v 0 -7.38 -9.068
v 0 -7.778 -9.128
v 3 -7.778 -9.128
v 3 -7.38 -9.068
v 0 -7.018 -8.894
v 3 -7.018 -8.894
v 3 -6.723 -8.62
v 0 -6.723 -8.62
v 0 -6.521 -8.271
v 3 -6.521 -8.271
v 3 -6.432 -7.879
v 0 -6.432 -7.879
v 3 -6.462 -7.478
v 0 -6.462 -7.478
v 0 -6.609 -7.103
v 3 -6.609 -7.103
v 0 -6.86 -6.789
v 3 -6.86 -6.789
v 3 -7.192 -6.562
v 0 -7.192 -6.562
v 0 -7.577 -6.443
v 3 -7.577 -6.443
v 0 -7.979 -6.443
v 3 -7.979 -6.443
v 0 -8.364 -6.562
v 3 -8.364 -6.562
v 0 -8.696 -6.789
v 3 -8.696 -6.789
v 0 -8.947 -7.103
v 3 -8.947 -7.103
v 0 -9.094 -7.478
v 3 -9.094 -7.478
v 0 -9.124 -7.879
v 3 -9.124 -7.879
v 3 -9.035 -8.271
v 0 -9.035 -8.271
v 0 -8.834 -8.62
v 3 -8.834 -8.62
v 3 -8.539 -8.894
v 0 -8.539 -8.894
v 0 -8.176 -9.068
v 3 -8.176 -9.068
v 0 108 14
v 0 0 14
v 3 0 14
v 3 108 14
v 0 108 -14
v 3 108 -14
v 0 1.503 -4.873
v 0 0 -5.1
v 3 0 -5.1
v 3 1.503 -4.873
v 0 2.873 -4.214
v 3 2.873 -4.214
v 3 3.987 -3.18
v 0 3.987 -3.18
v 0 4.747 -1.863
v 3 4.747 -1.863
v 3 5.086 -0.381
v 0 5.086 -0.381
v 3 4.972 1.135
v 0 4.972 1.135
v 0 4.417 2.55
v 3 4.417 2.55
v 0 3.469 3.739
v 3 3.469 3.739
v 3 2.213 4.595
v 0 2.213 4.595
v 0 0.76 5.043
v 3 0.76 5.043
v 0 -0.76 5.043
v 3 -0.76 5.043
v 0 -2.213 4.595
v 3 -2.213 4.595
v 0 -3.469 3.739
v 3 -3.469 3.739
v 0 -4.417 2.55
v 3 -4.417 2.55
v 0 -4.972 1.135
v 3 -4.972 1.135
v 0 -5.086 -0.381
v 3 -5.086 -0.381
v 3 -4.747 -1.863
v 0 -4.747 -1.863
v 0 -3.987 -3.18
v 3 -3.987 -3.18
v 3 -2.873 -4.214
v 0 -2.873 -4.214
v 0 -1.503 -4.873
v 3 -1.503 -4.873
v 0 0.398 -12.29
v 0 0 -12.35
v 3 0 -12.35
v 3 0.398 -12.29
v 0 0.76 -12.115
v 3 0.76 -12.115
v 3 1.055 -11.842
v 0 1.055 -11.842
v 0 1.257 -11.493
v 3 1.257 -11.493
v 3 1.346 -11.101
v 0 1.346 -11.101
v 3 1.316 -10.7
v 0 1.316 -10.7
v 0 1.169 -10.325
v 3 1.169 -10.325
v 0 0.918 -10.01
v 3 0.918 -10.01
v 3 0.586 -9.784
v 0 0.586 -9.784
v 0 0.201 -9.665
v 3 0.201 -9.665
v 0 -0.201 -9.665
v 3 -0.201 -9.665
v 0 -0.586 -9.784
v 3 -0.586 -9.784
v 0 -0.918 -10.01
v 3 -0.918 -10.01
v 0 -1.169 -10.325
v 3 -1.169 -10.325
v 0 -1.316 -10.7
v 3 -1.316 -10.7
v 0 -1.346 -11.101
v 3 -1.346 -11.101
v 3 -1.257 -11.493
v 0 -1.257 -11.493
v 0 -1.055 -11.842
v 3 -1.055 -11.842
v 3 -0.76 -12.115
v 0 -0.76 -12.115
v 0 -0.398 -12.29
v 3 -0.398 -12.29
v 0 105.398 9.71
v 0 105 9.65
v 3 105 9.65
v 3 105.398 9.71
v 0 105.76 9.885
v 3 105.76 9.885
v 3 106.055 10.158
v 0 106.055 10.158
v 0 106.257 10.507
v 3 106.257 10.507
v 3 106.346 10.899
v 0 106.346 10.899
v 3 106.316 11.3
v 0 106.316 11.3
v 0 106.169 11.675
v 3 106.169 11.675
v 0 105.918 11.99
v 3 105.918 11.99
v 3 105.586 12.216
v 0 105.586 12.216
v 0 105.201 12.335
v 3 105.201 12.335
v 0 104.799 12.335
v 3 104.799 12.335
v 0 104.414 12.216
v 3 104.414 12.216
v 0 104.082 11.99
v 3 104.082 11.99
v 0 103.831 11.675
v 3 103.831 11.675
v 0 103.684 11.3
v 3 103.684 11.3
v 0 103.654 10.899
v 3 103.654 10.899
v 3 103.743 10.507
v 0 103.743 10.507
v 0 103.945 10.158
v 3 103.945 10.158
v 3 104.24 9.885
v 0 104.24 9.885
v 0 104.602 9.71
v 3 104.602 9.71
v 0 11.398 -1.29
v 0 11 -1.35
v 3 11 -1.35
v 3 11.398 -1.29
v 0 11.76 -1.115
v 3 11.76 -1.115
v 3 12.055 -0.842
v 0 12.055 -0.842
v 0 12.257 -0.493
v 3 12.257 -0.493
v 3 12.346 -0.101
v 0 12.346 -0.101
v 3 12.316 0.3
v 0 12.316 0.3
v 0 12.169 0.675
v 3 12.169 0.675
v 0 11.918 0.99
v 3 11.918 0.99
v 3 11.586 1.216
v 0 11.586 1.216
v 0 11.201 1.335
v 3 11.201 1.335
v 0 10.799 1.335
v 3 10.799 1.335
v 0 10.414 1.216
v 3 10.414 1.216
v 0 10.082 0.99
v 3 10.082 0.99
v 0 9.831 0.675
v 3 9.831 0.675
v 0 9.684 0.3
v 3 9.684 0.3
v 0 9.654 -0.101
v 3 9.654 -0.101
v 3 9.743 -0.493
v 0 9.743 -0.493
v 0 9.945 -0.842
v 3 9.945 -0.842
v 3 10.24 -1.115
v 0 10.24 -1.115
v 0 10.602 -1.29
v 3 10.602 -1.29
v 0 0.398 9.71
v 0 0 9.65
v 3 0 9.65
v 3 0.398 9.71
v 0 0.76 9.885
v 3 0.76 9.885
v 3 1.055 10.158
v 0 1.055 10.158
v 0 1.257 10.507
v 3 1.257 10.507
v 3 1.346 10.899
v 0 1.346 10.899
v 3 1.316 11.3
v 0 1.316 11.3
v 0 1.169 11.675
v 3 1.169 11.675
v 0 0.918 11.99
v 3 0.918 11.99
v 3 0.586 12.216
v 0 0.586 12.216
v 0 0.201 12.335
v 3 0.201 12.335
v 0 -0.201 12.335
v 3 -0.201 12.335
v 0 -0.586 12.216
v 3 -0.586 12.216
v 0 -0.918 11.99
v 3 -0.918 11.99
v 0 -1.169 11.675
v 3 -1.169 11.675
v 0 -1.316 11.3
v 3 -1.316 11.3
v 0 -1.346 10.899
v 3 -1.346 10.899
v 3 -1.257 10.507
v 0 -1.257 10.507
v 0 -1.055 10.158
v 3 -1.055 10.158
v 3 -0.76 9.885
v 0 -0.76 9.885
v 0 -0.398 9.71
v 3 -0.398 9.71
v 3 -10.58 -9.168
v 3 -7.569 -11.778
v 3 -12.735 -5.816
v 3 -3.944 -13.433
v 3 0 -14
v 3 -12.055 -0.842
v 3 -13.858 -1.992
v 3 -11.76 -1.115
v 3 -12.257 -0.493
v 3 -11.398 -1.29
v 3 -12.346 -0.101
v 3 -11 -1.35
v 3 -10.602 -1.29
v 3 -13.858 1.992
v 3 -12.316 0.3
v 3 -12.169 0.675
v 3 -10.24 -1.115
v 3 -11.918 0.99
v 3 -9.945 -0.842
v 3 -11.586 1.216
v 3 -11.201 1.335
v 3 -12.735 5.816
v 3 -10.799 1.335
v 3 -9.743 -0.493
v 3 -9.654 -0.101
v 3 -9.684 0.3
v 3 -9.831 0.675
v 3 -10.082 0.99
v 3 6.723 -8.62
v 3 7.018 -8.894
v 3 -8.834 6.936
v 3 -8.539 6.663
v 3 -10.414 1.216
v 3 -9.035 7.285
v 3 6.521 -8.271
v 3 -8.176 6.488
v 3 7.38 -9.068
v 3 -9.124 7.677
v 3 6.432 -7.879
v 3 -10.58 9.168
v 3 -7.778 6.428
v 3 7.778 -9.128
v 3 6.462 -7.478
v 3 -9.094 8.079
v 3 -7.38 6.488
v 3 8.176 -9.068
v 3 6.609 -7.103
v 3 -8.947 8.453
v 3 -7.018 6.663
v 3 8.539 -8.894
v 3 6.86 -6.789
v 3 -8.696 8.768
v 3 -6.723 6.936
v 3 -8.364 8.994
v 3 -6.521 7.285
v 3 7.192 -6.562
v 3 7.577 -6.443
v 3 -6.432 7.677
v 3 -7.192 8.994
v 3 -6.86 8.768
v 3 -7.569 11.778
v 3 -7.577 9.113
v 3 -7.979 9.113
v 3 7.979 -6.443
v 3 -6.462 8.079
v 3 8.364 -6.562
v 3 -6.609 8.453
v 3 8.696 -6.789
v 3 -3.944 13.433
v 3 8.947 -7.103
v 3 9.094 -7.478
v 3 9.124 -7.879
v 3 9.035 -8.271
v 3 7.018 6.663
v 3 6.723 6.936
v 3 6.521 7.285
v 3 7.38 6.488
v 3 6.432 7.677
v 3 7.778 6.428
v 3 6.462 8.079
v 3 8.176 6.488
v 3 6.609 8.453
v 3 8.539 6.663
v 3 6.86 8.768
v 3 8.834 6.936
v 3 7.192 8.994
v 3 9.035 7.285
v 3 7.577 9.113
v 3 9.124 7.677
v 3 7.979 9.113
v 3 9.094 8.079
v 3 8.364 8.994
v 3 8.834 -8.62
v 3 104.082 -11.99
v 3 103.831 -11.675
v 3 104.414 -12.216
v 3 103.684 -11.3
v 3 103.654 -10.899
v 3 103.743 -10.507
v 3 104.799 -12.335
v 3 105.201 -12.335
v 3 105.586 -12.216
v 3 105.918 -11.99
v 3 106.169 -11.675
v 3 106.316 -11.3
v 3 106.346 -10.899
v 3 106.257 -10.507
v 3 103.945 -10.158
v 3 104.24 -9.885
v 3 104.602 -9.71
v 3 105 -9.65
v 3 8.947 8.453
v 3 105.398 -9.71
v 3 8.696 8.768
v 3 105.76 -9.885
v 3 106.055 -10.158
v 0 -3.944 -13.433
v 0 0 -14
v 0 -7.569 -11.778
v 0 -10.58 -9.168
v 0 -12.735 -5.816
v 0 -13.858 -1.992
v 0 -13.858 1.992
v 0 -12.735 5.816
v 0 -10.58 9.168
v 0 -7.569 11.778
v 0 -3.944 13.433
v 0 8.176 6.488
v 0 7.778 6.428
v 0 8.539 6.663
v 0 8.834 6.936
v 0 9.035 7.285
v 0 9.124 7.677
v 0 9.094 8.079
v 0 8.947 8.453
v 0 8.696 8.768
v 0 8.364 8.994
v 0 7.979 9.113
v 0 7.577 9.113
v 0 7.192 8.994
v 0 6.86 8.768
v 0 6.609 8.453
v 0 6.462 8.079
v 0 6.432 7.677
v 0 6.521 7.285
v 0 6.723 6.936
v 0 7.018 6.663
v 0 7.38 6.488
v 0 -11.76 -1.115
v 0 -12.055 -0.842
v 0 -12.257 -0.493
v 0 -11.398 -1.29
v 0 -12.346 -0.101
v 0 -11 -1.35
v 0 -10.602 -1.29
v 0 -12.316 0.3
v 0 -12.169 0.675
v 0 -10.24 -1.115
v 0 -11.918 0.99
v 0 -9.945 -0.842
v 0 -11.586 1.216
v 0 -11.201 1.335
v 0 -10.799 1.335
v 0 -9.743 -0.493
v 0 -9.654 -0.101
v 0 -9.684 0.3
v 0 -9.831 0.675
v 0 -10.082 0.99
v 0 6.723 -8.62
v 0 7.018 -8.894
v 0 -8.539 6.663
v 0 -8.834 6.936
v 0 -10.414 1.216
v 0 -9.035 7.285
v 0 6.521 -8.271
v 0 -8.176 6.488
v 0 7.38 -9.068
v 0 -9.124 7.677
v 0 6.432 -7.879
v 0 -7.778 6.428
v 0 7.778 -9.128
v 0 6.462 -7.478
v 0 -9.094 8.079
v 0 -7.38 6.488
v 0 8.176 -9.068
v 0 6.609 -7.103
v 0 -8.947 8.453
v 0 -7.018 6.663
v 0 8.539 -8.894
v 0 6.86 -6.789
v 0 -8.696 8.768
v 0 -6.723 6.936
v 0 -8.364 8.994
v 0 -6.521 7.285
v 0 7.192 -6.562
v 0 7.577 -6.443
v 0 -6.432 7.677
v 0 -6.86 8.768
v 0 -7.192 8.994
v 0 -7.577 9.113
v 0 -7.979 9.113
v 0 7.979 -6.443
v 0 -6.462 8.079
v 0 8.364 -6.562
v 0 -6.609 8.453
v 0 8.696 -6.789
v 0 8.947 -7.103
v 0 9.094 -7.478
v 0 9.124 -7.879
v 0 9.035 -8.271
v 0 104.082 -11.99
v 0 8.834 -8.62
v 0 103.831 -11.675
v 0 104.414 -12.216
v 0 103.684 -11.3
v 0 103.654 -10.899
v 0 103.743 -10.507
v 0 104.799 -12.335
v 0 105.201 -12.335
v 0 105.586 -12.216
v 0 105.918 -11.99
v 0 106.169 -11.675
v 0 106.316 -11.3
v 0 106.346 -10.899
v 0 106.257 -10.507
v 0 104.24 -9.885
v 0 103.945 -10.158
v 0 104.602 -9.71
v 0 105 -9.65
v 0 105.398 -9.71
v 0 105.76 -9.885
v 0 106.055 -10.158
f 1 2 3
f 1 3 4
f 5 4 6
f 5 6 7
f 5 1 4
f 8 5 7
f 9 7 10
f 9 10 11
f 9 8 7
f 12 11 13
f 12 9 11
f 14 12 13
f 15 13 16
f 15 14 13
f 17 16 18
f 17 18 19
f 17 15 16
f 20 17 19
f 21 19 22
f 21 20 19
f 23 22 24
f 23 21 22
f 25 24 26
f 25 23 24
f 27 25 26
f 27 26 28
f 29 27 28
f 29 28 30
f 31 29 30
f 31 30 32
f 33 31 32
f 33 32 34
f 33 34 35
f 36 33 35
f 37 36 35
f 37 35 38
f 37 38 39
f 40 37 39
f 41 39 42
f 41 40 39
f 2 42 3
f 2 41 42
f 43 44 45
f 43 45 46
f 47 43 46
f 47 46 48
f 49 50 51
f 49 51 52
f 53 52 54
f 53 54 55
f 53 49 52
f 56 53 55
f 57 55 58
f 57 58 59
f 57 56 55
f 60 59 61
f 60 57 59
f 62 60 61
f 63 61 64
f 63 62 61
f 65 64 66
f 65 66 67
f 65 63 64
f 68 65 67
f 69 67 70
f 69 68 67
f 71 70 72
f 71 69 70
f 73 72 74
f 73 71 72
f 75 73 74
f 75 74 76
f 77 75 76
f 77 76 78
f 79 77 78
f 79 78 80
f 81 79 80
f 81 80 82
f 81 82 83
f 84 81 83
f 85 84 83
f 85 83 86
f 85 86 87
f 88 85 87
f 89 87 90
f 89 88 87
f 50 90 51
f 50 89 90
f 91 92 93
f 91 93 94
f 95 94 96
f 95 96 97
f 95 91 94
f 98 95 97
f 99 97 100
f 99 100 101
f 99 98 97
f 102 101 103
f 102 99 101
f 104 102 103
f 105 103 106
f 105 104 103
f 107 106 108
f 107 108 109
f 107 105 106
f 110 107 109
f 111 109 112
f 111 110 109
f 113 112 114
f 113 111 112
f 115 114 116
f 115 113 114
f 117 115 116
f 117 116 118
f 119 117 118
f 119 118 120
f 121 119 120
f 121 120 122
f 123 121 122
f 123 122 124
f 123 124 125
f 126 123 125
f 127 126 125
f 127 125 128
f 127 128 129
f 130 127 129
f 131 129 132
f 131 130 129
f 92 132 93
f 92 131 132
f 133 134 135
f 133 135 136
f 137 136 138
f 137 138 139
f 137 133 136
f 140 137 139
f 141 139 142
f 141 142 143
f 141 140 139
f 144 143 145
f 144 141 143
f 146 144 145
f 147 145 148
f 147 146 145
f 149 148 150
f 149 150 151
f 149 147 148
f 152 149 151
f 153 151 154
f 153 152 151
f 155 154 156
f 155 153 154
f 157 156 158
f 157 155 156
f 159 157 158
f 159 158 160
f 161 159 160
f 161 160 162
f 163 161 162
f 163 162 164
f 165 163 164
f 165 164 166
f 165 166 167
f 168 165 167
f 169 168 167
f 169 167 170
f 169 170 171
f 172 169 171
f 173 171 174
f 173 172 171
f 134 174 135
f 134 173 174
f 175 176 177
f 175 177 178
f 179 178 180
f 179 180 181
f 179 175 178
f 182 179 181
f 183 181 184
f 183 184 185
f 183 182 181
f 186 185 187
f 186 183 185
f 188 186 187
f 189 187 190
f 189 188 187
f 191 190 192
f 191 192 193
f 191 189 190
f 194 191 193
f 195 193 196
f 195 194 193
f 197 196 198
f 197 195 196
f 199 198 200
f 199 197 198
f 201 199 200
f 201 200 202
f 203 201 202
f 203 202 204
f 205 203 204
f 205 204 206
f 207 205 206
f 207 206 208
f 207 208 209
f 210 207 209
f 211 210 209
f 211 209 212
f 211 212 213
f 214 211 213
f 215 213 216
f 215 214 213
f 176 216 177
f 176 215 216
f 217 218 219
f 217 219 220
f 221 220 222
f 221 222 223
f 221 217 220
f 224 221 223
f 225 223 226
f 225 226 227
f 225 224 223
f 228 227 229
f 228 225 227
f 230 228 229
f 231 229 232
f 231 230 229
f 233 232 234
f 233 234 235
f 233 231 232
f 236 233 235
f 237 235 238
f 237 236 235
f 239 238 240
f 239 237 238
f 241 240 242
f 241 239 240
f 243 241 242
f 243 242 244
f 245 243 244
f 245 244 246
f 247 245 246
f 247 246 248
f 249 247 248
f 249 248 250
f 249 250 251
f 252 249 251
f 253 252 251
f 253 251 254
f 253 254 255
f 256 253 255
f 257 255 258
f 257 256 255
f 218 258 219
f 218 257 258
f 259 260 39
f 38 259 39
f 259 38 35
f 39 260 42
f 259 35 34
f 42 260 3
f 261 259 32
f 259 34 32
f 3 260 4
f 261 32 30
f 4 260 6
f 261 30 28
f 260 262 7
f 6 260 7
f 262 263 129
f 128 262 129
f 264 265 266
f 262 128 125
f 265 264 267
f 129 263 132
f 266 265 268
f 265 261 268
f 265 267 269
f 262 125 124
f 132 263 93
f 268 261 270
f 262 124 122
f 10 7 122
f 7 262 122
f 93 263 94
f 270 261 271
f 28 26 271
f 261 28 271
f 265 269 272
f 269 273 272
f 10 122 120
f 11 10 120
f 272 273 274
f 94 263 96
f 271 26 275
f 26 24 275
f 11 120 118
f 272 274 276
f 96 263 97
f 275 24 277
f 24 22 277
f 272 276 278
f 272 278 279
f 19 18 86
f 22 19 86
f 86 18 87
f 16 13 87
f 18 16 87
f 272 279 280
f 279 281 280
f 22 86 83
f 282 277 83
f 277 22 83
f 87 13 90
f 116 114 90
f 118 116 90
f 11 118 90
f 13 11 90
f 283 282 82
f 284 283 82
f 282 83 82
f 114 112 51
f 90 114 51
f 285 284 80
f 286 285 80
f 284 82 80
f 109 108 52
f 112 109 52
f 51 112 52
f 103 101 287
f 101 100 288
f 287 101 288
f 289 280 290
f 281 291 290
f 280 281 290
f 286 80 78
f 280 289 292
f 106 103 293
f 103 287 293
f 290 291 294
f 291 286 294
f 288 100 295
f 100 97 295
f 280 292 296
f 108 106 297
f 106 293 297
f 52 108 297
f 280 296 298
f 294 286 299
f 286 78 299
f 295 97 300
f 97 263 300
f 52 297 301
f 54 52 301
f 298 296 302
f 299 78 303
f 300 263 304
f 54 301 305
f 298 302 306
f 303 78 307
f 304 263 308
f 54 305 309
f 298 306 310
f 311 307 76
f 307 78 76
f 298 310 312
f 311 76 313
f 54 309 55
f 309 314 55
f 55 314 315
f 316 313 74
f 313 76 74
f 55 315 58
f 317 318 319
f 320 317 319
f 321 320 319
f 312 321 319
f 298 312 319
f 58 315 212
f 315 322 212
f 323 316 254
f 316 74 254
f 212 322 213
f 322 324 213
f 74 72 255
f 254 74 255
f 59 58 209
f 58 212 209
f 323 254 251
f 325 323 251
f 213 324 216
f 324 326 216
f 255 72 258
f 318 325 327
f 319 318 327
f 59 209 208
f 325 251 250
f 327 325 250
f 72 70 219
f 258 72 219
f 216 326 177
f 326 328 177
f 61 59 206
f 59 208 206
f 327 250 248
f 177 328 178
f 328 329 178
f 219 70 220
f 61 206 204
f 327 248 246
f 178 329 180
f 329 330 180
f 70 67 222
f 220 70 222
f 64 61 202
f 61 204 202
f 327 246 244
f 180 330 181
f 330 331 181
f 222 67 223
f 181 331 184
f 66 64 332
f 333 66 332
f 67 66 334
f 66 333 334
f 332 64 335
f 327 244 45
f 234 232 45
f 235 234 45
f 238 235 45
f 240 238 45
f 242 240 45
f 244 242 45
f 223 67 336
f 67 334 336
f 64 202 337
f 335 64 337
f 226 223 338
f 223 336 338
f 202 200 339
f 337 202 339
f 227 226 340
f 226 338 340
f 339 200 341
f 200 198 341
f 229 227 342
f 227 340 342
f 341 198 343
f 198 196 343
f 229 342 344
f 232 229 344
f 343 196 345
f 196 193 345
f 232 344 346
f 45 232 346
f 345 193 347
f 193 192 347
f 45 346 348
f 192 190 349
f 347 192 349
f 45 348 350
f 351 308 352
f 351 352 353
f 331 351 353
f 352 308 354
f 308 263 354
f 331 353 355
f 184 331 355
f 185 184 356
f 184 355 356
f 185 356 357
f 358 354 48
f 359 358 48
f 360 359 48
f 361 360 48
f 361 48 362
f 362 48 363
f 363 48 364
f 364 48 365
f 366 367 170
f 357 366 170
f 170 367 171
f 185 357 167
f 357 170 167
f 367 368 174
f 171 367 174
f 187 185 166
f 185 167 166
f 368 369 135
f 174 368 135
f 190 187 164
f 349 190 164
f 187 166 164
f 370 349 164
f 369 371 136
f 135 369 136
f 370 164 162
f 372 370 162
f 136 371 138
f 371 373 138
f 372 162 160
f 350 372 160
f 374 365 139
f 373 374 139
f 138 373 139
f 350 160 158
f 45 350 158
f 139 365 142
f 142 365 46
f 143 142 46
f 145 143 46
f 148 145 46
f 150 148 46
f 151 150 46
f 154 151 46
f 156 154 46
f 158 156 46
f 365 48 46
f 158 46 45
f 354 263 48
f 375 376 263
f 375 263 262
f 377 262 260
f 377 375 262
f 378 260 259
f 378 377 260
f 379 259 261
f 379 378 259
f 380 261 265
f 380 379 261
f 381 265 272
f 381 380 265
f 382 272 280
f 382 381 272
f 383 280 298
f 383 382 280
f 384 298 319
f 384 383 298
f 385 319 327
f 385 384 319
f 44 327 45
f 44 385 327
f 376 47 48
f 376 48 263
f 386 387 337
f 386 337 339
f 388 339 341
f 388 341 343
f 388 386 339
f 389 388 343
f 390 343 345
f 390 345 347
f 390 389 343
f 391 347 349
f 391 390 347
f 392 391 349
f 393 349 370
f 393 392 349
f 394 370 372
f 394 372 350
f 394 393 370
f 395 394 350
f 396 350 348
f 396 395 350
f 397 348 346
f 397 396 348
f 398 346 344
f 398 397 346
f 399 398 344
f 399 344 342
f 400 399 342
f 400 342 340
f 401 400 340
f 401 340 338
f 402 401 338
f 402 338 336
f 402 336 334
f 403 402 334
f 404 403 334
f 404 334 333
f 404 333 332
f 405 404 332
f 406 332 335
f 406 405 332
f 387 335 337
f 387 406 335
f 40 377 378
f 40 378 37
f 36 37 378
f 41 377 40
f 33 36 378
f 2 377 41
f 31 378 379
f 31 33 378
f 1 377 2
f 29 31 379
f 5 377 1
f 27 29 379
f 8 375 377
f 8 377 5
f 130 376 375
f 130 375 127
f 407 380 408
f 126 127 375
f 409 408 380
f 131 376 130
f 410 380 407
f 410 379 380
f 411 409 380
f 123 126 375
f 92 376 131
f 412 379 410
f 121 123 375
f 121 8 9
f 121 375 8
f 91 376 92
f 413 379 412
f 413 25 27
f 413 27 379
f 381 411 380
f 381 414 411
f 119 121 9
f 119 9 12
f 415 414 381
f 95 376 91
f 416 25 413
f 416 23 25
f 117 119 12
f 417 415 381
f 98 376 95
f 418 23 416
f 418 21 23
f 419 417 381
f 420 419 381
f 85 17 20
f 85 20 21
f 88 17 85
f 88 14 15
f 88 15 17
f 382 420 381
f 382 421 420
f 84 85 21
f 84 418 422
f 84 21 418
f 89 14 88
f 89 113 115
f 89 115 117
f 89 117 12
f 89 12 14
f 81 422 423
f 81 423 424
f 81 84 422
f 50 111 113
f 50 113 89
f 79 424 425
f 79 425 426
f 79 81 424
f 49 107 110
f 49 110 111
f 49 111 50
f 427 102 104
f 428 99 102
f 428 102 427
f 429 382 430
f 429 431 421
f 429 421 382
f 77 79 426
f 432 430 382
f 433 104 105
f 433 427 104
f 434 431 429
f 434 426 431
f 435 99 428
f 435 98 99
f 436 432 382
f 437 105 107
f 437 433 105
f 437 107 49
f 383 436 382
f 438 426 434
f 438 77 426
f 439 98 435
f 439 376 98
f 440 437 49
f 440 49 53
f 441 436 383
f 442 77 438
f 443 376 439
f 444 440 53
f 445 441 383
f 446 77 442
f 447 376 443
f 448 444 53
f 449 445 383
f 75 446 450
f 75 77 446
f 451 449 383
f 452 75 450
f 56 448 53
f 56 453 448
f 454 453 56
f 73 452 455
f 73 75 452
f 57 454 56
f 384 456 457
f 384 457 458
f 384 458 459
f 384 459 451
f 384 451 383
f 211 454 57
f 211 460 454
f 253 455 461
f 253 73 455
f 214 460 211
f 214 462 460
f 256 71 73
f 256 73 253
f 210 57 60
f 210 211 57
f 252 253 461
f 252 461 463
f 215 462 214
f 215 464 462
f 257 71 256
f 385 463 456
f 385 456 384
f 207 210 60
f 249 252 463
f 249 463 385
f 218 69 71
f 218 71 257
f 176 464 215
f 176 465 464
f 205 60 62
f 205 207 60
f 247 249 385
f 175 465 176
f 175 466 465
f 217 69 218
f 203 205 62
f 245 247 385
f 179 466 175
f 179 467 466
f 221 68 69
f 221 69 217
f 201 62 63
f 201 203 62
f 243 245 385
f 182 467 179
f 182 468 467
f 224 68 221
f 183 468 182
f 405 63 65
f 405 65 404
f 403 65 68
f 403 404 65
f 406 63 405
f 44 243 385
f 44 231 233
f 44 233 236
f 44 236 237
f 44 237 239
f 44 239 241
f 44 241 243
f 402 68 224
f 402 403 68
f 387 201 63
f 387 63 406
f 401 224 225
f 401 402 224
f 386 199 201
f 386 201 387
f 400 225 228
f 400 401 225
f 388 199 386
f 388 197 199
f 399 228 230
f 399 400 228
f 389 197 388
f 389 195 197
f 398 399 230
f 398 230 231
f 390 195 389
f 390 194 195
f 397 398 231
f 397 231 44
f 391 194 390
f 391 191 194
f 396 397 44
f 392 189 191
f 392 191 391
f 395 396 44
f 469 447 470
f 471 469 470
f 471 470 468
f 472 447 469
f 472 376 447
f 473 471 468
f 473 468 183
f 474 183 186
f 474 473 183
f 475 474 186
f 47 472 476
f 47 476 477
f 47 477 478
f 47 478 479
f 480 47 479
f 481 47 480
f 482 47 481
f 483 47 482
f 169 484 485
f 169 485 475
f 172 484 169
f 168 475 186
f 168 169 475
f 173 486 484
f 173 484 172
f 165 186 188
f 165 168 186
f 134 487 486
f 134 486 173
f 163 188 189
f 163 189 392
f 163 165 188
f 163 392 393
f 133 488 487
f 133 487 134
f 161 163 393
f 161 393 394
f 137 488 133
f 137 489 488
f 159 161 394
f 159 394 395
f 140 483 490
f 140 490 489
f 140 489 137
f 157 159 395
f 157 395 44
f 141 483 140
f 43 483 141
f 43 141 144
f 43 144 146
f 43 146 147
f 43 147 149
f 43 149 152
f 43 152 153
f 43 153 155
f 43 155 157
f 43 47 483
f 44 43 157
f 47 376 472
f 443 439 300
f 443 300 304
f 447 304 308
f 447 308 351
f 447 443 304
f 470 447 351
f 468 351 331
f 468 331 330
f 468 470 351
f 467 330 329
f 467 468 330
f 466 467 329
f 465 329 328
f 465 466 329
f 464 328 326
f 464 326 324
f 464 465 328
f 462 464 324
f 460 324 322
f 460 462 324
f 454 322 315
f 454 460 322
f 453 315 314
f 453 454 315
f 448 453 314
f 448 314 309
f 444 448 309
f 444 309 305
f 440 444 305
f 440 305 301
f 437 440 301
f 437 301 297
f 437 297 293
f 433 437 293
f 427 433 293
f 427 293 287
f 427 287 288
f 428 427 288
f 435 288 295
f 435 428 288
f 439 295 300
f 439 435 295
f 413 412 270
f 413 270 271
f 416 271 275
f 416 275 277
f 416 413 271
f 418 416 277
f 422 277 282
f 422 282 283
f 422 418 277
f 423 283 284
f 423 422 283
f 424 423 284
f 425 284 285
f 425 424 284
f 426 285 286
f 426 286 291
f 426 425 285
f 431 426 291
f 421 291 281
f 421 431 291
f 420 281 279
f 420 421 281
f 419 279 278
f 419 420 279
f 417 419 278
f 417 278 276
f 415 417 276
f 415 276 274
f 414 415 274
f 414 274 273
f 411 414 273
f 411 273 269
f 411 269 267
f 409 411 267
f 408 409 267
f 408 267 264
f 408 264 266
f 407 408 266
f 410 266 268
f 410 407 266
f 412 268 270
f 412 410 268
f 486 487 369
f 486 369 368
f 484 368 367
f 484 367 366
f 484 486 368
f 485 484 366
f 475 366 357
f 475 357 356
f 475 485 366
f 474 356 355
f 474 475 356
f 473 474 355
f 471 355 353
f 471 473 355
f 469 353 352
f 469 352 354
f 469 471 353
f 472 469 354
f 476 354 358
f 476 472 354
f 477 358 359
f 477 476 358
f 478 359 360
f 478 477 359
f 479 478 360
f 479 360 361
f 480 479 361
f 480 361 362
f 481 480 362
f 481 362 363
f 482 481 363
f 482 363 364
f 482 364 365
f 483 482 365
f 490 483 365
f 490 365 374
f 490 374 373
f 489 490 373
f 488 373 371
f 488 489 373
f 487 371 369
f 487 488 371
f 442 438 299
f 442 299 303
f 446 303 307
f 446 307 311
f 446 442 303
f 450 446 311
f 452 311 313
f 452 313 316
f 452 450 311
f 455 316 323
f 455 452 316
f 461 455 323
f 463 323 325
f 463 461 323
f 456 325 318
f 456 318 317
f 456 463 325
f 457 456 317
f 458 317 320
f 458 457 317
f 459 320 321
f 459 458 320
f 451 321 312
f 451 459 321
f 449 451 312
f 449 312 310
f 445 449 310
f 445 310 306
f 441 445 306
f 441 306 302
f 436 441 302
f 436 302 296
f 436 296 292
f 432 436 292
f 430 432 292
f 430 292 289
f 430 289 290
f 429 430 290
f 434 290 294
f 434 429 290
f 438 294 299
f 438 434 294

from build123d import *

# Parameters (mm, degrees)
SKETCH_1_R      = 1.35
SKETCH_1_R_2    = 5.1
EXTRUDE_1_DEPTH = 3


with BuildPart() as part:
    # 草图1 → 凸台-拉伸1 (new body)
    with BuildSketch(Plane(origin=(0, 0, 0), x_dir=(0, 0, -1), z_dir=(1, 0, 0))):
        with BuildLine():
            Line((-14, 0), (-14, 108))
            Line((-14, 108), (14, 108))
            Line((14, 108), (14, 0))
            ThreePointArc((14, 0), (0, -14), (-14, 0))
        make_face()
        with Locations((0, -11)):
            Circle(SKETCH_1_R, mode=Mode.SUBTRACT)
        with Locations((-7.778174593, -7.778174593)):
            Circle(SKETCH_1_R, mode=Mode.SUBTRACT)
        with Locations((-11, 0)):
            Circle(SKETCH_1_R, mode=Mode.SUBTRACT)
        with Locations((-7.778174593, 7.778174593)):
            Circle(SKETCH_1_R, mode=Mode.SUBTRACT)
        with Locations((0, 11)):
            Circle(SKETCH_1_R, mode=Mode.SUBTRACT)
        with Locations((7.778174593, 7.778174593)):
            Circle(SKETCH_1_R, mode=Mode.SUBTRACT)
        with Locations((11, 0)):
            Circle(SKETCH_1_R, mode=Mode.SUBTRACT)
        with Locations((7.778174593, -7.778174593)):
            Circle(SKETCH_1_R, mode=Mode.SUBTRACT)
        Circle(SKETCH_1_R_2, mode=Mode.SUBTRACT)
        with Locations((-11, 105)):
            Circle(SKETCH_1_R, mode=Mode.SUBTRACT)
        with Locations(Location((11, 105, 0), (0, 0, 180))):
            Circle(SKETCH_1_R, mode=Mode.SUBTRACT)
    extrude(amount=EXTRUDE_1_DEPTH)


solid = part.part
